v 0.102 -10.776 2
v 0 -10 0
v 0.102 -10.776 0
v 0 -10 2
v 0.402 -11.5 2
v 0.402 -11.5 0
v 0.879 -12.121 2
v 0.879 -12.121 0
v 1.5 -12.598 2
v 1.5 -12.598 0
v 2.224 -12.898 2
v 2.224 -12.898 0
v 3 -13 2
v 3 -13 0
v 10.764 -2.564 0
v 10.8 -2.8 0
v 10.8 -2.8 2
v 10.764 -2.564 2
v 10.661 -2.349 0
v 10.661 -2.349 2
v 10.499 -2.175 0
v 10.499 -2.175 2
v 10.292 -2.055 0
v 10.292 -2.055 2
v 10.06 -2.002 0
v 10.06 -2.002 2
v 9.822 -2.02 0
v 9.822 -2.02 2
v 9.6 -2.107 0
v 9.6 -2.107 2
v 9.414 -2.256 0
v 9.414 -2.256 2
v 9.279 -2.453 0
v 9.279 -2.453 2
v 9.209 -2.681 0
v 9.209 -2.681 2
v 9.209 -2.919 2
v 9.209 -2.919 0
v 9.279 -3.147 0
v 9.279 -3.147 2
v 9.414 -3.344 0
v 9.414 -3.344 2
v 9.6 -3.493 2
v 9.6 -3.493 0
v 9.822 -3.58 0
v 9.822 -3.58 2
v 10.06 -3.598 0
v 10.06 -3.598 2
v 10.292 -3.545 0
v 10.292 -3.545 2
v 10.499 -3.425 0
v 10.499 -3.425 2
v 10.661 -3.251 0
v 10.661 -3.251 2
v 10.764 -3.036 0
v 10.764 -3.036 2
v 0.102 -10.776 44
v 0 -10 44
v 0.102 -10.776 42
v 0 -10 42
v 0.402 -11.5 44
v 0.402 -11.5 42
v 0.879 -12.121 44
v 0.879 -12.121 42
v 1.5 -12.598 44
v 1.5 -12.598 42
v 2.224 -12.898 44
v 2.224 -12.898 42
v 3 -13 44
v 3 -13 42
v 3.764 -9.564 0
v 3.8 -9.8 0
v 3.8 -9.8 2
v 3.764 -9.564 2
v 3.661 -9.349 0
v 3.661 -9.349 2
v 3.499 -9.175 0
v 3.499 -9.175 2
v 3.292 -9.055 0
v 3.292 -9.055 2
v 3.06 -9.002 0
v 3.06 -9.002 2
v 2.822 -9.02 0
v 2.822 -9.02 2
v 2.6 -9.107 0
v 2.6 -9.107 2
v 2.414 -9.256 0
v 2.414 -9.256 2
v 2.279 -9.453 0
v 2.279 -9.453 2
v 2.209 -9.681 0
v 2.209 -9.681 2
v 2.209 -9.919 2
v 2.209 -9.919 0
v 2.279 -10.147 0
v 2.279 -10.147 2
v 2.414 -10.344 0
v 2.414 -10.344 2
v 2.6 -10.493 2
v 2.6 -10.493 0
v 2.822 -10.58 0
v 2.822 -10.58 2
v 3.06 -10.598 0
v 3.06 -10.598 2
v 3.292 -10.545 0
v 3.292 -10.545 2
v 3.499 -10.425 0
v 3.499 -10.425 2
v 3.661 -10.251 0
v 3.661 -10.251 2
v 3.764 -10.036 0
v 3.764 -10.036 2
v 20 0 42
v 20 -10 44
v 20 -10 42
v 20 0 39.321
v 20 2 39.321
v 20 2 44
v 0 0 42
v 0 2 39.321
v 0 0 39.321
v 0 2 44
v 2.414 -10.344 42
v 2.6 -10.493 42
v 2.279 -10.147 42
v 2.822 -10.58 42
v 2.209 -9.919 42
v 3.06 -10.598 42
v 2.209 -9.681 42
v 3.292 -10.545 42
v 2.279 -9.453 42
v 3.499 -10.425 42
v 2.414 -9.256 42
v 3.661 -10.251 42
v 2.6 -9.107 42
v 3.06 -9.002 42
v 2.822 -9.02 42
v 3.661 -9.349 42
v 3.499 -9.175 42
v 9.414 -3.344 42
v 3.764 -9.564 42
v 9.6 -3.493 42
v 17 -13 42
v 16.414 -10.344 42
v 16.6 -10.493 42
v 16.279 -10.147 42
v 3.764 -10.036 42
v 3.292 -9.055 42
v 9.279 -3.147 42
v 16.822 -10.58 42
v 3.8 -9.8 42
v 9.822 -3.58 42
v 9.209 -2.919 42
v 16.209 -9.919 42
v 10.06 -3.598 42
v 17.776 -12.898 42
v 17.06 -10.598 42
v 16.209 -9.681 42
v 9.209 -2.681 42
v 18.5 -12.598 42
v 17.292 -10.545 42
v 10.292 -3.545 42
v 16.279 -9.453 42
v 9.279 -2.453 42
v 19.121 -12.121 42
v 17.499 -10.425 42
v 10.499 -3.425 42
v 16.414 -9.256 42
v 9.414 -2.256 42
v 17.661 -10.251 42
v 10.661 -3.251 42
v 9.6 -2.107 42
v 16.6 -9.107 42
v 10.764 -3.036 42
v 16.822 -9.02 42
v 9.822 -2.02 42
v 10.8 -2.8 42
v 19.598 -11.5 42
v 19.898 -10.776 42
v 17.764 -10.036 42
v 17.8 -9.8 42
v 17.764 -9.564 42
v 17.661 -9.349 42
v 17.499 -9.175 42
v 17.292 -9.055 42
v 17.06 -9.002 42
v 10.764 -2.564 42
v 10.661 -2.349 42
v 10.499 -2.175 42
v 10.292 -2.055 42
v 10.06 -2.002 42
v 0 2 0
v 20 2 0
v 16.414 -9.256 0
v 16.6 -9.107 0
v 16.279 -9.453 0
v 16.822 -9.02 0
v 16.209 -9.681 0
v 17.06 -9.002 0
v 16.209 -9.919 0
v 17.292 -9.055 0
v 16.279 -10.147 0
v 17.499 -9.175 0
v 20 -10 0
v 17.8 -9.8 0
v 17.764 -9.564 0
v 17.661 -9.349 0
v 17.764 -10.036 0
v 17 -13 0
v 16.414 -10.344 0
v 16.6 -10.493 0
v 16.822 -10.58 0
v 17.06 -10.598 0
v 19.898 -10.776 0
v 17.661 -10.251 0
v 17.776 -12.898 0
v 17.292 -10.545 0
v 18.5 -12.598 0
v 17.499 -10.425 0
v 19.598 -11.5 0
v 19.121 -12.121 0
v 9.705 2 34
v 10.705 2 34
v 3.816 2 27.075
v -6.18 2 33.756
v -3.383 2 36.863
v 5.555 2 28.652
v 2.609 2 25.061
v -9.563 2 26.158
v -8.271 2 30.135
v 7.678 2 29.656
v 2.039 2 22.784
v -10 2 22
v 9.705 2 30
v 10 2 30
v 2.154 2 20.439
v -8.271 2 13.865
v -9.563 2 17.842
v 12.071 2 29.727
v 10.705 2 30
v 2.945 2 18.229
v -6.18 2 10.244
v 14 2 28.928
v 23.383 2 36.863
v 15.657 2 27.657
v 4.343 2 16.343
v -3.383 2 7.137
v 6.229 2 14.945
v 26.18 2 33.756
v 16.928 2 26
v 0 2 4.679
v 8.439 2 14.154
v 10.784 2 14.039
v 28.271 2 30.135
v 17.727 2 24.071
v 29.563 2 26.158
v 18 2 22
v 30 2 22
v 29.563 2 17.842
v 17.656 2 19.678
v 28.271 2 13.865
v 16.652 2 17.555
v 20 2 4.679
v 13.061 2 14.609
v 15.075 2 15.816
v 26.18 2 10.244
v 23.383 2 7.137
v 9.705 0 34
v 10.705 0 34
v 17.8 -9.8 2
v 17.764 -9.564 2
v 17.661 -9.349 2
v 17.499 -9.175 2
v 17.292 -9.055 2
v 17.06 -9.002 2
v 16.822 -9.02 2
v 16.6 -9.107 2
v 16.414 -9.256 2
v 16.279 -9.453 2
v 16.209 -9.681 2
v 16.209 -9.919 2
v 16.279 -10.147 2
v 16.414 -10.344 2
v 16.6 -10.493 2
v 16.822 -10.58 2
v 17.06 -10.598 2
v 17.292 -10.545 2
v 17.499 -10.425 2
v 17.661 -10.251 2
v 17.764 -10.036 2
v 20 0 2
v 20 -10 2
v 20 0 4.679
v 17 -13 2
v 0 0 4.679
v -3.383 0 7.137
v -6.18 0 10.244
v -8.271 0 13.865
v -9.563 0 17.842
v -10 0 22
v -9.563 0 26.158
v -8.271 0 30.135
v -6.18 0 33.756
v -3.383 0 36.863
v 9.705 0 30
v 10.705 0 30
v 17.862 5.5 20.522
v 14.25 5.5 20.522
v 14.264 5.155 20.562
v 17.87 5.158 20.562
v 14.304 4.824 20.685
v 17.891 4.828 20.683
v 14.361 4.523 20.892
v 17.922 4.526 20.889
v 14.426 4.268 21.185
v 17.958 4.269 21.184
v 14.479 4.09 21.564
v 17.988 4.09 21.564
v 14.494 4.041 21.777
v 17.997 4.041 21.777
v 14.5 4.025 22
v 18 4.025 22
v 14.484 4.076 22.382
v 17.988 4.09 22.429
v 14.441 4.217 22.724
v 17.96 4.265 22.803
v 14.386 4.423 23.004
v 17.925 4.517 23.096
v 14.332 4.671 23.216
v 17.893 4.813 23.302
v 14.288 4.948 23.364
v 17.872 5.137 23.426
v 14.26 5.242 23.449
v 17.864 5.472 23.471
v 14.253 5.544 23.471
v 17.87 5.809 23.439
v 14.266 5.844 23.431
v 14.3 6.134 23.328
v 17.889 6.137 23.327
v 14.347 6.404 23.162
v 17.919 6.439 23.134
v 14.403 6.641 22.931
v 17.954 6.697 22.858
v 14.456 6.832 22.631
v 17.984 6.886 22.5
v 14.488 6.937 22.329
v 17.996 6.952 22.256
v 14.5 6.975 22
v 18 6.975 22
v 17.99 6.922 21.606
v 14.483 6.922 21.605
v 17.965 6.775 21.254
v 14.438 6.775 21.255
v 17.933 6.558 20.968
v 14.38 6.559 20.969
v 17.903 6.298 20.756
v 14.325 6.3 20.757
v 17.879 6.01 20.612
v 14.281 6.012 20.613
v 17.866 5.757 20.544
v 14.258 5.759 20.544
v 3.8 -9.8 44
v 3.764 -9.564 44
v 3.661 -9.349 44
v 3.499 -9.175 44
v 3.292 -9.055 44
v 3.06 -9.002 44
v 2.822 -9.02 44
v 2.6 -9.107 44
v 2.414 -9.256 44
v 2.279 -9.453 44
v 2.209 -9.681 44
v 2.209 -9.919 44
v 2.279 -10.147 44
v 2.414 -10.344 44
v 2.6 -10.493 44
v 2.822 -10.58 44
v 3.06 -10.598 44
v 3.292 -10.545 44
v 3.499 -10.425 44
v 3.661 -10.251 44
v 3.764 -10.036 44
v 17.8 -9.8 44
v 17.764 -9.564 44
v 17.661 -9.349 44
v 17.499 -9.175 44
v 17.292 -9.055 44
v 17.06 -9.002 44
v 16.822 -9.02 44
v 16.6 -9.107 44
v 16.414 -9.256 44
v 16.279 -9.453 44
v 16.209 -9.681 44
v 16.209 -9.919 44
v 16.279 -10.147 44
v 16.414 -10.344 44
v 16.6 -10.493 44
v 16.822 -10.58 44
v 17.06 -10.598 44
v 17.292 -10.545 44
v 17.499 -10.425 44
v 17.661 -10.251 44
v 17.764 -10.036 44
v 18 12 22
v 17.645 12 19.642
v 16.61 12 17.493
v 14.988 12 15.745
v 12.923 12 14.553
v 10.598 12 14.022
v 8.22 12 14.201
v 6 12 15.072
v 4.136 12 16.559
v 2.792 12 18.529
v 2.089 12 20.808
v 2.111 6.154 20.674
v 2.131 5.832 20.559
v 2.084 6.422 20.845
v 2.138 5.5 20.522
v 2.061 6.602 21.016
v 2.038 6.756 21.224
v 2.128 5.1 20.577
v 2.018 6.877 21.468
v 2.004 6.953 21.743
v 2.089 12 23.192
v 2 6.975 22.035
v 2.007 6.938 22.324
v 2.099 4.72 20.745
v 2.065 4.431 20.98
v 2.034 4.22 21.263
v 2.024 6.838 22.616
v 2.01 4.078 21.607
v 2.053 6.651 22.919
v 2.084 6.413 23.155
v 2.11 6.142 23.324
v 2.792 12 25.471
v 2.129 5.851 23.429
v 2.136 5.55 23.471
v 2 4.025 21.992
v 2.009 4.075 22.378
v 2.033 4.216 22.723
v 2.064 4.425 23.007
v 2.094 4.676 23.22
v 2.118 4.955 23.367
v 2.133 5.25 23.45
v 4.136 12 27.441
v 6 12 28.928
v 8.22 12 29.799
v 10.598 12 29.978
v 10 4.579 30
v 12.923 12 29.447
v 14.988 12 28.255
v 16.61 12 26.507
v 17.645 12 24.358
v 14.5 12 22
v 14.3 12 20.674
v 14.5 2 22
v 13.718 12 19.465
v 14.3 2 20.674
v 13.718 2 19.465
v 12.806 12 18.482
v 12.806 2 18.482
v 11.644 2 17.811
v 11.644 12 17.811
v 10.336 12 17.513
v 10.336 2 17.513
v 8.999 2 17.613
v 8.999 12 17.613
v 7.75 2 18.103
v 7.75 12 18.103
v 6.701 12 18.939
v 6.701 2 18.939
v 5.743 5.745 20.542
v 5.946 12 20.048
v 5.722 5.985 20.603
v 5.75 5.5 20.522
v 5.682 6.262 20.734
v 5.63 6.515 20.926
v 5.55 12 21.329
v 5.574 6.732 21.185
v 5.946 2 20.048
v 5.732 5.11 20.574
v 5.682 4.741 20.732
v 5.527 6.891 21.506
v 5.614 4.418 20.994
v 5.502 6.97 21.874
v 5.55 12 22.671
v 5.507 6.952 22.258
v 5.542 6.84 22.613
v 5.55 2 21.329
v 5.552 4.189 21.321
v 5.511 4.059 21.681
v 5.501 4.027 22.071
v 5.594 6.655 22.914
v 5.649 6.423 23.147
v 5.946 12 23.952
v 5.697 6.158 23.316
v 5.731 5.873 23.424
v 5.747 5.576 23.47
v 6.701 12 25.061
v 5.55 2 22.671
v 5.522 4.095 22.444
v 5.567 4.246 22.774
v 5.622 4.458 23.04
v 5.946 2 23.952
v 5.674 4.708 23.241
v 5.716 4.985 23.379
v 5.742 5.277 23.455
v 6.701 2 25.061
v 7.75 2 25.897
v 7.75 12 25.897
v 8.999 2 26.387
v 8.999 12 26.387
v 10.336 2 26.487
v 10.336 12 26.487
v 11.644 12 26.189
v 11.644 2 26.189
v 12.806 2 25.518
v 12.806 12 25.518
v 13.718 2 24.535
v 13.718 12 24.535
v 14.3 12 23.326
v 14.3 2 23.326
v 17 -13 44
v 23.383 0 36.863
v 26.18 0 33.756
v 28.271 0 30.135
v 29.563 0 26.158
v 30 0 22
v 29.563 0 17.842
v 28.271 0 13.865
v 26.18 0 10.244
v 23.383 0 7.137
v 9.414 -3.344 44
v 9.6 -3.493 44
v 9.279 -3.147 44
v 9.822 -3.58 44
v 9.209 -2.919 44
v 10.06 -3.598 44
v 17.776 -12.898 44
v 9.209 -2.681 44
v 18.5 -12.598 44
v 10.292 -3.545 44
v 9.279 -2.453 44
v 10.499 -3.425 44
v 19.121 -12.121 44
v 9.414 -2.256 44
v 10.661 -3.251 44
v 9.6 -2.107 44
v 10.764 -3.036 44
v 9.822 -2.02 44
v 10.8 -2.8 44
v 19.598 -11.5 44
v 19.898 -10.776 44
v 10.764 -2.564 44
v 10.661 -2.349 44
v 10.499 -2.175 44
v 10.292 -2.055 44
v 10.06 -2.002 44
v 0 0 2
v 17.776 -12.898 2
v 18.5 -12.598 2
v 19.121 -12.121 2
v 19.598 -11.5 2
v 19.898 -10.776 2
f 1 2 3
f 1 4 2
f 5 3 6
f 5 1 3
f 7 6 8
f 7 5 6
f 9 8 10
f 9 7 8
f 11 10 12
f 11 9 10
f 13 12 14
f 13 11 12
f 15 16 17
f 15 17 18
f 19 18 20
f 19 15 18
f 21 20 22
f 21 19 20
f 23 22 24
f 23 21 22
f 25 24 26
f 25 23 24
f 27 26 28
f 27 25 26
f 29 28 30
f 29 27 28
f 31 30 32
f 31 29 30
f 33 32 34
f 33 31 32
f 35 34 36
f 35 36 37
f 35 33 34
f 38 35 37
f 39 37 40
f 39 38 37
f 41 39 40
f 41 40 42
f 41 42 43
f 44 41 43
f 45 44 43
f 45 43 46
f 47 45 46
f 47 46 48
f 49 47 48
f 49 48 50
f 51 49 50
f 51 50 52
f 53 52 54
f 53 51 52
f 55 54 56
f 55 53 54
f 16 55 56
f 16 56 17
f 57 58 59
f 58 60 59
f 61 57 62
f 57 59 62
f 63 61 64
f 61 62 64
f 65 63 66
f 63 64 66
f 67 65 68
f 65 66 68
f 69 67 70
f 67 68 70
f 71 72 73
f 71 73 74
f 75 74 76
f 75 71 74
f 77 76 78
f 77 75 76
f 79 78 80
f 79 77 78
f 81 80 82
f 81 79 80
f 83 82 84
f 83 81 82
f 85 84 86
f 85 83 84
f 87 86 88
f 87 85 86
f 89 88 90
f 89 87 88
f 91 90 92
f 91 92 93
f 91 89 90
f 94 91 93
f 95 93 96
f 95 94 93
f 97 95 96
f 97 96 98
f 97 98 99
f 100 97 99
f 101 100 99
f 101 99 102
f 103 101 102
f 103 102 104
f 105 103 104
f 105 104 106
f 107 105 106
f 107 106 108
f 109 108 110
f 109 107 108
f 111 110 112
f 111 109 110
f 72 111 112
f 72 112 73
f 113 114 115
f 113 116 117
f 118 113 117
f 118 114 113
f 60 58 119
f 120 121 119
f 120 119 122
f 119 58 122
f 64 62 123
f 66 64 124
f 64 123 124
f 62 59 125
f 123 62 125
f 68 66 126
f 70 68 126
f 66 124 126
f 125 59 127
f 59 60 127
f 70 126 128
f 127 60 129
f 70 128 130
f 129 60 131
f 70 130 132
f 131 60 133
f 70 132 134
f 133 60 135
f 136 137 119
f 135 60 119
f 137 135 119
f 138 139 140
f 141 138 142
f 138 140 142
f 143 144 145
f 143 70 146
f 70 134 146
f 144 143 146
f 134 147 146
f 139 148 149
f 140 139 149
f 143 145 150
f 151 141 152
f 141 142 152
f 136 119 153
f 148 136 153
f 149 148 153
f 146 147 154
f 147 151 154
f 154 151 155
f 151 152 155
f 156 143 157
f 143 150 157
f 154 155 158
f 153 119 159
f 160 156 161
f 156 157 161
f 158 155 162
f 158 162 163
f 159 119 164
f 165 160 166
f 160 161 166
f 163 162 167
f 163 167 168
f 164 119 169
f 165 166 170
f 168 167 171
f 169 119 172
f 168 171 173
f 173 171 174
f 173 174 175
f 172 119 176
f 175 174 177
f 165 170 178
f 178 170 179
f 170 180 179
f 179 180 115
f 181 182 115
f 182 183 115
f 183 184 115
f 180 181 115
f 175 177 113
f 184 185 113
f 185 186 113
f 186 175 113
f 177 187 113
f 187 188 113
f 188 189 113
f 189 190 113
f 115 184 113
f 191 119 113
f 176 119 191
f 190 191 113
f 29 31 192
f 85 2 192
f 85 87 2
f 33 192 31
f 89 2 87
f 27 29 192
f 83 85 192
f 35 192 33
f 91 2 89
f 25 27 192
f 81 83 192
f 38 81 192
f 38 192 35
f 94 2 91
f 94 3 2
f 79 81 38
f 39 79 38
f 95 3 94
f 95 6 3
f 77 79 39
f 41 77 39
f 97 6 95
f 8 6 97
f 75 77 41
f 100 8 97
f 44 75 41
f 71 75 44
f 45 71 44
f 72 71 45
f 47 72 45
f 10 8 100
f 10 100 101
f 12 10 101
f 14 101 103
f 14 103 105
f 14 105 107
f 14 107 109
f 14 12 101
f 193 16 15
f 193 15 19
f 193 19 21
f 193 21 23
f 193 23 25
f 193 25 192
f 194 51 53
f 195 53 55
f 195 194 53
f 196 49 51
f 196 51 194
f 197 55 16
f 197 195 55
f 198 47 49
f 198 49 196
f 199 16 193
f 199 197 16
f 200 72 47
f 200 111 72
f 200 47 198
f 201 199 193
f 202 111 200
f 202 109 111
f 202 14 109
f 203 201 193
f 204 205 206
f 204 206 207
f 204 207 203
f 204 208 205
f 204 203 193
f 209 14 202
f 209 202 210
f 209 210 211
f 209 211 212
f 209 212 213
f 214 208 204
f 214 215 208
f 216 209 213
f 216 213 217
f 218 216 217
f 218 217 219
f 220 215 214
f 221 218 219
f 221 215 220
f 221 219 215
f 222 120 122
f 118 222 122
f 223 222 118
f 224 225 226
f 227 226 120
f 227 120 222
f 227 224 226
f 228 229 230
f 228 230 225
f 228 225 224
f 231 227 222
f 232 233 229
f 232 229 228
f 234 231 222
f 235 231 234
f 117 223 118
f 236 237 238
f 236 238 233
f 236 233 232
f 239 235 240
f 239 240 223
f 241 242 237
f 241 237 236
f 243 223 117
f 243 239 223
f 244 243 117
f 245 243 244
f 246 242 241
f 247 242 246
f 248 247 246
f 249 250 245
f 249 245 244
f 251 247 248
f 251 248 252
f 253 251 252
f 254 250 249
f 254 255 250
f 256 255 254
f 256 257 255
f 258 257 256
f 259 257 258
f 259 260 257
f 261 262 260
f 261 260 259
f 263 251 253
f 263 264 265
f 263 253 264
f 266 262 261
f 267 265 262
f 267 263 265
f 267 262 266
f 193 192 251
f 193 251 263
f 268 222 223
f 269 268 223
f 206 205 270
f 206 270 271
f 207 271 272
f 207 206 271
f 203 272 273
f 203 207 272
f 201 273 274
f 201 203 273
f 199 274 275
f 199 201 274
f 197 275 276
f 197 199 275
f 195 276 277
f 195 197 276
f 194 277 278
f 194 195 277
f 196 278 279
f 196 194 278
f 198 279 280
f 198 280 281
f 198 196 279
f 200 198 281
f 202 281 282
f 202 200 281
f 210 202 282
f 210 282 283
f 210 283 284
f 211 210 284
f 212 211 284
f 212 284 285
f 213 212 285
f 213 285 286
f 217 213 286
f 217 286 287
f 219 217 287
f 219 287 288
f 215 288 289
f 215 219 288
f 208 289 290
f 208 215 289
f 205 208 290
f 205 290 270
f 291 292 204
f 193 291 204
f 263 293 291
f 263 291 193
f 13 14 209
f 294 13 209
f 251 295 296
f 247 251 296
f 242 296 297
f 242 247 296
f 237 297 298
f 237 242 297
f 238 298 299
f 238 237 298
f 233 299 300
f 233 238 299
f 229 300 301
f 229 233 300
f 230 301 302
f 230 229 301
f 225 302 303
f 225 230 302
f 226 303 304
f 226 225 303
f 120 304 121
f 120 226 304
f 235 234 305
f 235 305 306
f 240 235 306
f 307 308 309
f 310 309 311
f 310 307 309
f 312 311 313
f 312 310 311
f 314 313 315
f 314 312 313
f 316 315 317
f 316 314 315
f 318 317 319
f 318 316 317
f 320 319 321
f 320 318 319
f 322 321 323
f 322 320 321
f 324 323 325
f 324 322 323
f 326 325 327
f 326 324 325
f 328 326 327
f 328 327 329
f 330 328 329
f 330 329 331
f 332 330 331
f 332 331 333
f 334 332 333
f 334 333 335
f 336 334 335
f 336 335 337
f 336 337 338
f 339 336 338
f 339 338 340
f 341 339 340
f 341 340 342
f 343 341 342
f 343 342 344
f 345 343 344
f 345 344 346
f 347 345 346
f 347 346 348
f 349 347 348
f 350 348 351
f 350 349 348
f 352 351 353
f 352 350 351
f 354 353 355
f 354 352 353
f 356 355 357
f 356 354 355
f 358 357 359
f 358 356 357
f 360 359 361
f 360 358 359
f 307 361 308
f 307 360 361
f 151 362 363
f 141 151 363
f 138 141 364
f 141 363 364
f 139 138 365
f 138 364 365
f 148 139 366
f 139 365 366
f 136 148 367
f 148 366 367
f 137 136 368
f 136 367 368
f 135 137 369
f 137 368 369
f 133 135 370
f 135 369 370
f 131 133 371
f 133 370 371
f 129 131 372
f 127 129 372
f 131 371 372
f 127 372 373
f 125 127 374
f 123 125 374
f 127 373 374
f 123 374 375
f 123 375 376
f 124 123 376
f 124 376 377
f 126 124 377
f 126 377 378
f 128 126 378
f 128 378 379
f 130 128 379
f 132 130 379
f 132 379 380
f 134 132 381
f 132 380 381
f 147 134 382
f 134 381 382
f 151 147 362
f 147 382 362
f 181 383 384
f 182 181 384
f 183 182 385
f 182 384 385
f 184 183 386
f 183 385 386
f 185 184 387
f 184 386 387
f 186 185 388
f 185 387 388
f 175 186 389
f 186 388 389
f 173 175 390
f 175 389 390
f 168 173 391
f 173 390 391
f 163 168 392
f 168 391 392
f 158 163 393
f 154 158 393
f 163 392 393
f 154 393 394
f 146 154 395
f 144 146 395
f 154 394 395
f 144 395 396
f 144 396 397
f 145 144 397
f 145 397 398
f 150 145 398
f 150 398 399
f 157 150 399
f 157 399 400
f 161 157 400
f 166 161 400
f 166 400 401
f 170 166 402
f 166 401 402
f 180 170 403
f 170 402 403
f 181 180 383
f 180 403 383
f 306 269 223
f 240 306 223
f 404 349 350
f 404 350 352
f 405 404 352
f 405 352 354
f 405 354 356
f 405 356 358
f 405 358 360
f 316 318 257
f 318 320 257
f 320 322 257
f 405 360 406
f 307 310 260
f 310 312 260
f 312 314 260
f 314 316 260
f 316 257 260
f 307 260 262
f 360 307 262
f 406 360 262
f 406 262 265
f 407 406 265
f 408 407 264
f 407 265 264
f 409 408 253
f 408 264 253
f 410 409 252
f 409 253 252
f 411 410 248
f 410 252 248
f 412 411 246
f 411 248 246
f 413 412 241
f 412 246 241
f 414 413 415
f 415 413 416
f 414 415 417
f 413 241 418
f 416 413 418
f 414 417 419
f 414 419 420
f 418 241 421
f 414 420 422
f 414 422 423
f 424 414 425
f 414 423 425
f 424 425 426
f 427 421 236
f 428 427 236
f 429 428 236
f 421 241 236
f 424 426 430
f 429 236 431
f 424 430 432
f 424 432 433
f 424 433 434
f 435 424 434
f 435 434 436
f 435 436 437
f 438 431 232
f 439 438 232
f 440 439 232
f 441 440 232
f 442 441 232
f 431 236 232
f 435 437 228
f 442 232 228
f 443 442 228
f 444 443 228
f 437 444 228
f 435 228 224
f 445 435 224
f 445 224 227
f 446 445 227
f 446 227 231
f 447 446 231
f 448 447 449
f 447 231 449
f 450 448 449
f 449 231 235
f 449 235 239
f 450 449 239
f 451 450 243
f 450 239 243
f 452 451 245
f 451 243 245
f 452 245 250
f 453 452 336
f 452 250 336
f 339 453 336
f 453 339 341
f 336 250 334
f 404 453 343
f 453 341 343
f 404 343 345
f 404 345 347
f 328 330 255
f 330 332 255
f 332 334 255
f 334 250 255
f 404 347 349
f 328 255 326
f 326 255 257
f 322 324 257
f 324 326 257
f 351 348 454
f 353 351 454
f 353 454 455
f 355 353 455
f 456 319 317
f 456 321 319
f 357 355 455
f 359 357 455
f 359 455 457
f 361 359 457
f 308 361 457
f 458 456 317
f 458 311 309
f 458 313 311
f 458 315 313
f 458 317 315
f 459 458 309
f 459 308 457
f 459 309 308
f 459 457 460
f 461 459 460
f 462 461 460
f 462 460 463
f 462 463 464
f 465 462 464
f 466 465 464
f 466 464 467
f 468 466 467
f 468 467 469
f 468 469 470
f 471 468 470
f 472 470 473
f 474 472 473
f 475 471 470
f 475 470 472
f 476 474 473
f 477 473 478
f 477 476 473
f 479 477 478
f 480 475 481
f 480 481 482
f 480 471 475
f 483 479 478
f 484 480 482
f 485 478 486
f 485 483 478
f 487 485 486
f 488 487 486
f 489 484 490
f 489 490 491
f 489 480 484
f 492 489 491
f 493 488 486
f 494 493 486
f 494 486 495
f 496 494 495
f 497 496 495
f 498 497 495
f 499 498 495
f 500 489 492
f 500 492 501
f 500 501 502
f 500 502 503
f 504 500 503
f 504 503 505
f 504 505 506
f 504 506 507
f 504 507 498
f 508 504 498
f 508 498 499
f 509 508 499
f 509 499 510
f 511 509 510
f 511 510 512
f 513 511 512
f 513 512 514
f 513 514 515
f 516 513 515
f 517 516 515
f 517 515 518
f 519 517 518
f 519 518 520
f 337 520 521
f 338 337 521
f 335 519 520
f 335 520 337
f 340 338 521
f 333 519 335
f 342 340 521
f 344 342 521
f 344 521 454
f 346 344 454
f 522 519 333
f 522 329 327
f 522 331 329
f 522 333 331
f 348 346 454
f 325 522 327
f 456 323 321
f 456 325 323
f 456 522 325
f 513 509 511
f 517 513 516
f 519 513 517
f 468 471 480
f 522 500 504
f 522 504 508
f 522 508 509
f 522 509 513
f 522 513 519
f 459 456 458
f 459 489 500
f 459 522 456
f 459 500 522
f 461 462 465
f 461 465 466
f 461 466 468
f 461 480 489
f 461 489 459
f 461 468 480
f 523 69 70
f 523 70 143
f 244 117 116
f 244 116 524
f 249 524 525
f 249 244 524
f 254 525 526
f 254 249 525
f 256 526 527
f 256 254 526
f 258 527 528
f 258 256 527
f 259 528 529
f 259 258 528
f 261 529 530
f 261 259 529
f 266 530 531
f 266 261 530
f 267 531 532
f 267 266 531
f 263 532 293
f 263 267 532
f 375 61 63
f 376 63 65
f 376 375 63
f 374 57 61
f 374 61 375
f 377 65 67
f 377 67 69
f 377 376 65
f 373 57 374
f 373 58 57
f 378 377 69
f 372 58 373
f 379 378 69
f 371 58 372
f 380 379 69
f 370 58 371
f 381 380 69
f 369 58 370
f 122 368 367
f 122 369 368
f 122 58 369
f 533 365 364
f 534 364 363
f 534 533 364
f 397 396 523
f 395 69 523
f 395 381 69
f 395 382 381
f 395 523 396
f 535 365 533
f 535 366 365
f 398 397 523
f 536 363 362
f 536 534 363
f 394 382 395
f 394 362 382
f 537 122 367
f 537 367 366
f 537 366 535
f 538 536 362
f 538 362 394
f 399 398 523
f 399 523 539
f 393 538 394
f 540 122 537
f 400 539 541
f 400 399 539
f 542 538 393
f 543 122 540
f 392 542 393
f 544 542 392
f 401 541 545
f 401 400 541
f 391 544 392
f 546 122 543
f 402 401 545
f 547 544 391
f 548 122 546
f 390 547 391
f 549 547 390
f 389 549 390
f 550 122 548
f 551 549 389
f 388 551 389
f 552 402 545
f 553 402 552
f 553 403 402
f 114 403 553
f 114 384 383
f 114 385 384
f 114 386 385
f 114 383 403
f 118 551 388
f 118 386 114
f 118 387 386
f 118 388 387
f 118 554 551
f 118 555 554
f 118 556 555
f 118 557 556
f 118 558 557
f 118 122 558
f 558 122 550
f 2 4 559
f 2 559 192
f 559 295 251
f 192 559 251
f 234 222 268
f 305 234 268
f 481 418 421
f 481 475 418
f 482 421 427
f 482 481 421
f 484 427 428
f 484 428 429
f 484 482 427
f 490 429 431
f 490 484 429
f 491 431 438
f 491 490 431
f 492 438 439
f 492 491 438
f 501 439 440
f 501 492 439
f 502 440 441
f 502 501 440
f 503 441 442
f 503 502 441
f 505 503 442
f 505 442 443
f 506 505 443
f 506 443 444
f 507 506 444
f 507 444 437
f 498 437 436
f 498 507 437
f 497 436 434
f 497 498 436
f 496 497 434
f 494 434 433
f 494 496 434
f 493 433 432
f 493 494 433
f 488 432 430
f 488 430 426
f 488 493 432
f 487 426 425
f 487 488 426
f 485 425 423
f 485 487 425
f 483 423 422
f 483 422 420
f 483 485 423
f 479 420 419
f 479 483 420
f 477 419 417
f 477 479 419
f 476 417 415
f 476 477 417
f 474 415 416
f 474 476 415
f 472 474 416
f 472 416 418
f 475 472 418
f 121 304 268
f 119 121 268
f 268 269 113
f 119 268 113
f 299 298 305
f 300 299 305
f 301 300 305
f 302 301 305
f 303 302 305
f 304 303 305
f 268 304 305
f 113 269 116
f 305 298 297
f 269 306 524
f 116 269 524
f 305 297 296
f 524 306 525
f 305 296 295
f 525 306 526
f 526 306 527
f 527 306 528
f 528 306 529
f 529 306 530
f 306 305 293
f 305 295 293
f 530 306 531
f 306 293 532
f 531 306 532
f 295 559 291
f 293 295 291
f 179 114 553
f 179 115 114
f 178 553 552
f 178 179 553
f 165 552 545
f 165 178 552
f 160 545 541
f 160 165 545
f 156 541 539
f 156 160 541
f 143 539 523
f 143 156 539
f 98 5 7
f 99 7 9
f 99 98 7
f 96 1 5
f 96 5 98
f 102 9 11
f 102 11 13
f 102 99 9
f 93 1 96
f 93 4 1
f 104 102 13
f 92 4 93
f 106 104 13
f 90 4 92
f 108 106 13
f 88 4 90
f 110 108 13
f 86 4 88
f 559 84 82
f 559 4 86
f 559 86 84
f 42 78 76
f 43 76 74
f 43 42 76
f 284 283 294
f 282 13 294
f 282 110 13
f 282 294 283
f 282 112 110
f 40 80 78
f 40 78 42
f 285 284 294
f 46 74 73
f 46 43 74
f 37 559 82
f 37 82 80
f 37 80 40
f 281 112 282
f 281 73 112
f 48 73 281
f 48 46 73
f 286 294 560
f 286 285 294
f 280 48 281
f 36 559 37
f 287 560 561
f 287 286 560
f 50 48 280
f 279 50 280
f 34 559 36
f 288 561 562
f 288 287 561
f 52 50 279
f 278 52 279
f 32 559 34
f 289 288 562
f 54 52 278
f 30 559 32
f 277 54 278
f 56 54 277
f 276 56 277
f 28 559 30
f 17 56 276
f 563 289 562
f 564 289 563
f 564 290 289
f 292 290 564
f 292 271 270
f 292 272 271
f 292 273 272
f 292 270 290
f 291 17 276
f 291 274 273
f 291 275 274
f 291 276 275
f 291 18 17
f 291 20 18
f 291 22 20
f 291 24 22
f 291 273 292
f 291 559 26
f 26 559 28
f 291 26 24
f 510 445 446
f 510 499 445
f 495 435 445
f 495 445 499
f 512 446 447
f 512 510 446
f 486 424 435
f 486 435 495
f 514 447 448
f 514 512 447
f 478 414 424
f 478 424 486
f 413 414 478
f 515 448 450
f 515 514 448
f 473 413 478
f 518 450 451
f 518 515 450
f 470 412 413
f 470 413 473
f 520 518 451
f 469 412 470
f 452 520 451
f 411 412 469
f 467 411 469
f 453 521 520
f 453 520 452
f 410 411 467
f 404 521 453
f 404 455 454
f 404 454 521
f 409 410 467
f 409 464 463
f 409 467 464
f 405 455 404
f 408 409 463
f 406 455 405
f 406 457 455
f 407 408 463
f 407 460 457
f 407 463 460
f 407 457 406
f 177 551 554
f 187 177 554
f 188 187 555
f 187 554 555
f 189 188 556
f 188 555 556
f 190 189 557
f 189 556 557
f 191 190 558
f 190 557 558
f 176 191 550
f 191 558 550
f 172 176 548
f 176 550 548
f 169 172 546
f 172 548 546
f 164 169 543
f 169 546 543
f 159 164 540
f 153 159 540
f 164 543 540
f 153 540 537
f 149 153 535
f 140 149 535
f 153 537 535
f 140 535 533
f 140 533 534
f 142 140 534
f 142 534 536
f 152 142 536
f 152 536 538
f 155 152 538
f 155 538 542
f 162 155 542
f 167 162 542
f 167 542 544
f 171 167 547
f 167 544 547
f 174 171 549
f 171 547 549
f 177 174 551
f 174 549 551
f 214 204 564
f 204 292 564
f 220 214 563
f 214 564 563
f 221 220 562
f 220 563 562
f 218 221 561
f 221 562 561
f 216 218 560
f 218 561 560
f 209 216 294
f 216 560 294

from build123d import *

# Parameters (mm, degrees)
SKETCH_1_W          = 20
SKETCH_1_H          = 13
SKETCH_1_R          = 0.8
EXTRUDE_1_DEPTH     = 2
SKETCH_2_W          = 20
SKETCH_2_H          = 44
EXTRUDE_2_DEPTH     = 2
SKETCH_3_R          = 8
SKETCH_3_R_2        = 4.5
EXTRUDE_3_DEPTH     = 10
SKETCH_4_R          = 20
EXTRUDE_4_DEPTH     = 2
SKETCH_6_W          = 20.177677641
SKETCH_6_H          = 1.475
CUT_EXTRUDE_1_DEPTH = 4
FILLET_1_R          = 3


with BuildPart() as part:
    # 草图1 → 凸台-拉伸1 (new body)
    with BuildSketch(Plane.XY):
        with Locations((10, -6.5)):
            Rectangle(SKETCH_1_W, SKETCH_1_H)
        with Locations((10, -2.8)):
            Circle(SKETCH_1_R, mode=Mode.SUBTRACT)
        with Locations((17, -9.8)):
            Circle(SKETCH_1_R, mode=Mode.SUBTRACT)
        with Locations((3, -9.8)):
            Circle(SKETCH_1_R, mode=Mode.SUBTRACT)
    extrude_1 = extrude(amount=EXTRUDE_1_DEPTH)

    # 草图2 → 凸台-拉伸2 (add)
    with BuildSketch(Plane(origin=(0, 0, 0), x_dir=(1, 0, 0), z_dir=(0, 1, 0))):
        with Locations((10, -22)):
            Rectangle(SKETCH_2_W, SKETCH_2_H)
    extrude(amount=EXTRUDE_2_DEPTH)

    # 镜向1: 凸台-拉伸1 across plane
    add(extrude_1.mirror(Plane.XY.offset(22)))

    # 草图3 → 凸台-拉伸3 (add)
    with BuildSketch(Plane(origin=(0, 2, 0), x_dir=(1, 0, 0), z_dir=(0, 1, 0))):
        with Locations((10, -22)):
            Circle(SKETCH_3_R)
        with Locations((10, -22)):
            Circle(SKETCH_3_R_2, mode=Mode.SUBTRACT)
    extrude(amount=EXTRUDE_3_DEPTH)

    # 草图4 → 凸台-拉伸4 (add)
    with BuildSketch(Plane(origin=(0, 2, 0), x_dir=(1, 0, 0), z_dir=(0, 1, 0))):
        with Locations((10, -22)):
            Circle(SKETCH_4_R)
    extrude(amount=-EXTRUDE_4_DEPTH)

    # 草图6 → 切除-旋转1 (revolve, cut)
    with BuildSketch(Plane(origin=(0, 5.5, 0), x_dir=(1, 0, 0), z_dir=(0, 1, 0))):
        with Locations((10.210002175, -21.25904805)):
            Rectangle(SKETCH_6_W, SKETCH_6_H)
    revolve(axis=Axis((22.976612399, 5.5, 21.99654805), (-1, 0, 0)), mode=Mode.SUBTRACT)

    # 草图7 → 切除-拉伸1 (cut)
    with BuildSketch(Plane.XY.offset(34)):
        Polygon((9.704672539, 4.57882911), (9.704672539, 2), (9.704672539, 1.881120606), (9.704672539, -0.127173503), (10.704672539, -0.127173503), (10.704672539, 4.57882911), align=None)
    extrude(amount=-CUT_EXTRUDE_1_DEPTH, mode=Mode.SUBTRACT)

    # 圆角1
    fillet_1_edges = [part.edges().sort_by_distance(p)[0] for p in [
        (0, -13, 43),
        (20, -13, 43),
        (20, -13, 1),
        (0, -13, 1),
    ]]
    fillet(fillet_1_edges, radius=FILLET_1_R)


solid = part.part
